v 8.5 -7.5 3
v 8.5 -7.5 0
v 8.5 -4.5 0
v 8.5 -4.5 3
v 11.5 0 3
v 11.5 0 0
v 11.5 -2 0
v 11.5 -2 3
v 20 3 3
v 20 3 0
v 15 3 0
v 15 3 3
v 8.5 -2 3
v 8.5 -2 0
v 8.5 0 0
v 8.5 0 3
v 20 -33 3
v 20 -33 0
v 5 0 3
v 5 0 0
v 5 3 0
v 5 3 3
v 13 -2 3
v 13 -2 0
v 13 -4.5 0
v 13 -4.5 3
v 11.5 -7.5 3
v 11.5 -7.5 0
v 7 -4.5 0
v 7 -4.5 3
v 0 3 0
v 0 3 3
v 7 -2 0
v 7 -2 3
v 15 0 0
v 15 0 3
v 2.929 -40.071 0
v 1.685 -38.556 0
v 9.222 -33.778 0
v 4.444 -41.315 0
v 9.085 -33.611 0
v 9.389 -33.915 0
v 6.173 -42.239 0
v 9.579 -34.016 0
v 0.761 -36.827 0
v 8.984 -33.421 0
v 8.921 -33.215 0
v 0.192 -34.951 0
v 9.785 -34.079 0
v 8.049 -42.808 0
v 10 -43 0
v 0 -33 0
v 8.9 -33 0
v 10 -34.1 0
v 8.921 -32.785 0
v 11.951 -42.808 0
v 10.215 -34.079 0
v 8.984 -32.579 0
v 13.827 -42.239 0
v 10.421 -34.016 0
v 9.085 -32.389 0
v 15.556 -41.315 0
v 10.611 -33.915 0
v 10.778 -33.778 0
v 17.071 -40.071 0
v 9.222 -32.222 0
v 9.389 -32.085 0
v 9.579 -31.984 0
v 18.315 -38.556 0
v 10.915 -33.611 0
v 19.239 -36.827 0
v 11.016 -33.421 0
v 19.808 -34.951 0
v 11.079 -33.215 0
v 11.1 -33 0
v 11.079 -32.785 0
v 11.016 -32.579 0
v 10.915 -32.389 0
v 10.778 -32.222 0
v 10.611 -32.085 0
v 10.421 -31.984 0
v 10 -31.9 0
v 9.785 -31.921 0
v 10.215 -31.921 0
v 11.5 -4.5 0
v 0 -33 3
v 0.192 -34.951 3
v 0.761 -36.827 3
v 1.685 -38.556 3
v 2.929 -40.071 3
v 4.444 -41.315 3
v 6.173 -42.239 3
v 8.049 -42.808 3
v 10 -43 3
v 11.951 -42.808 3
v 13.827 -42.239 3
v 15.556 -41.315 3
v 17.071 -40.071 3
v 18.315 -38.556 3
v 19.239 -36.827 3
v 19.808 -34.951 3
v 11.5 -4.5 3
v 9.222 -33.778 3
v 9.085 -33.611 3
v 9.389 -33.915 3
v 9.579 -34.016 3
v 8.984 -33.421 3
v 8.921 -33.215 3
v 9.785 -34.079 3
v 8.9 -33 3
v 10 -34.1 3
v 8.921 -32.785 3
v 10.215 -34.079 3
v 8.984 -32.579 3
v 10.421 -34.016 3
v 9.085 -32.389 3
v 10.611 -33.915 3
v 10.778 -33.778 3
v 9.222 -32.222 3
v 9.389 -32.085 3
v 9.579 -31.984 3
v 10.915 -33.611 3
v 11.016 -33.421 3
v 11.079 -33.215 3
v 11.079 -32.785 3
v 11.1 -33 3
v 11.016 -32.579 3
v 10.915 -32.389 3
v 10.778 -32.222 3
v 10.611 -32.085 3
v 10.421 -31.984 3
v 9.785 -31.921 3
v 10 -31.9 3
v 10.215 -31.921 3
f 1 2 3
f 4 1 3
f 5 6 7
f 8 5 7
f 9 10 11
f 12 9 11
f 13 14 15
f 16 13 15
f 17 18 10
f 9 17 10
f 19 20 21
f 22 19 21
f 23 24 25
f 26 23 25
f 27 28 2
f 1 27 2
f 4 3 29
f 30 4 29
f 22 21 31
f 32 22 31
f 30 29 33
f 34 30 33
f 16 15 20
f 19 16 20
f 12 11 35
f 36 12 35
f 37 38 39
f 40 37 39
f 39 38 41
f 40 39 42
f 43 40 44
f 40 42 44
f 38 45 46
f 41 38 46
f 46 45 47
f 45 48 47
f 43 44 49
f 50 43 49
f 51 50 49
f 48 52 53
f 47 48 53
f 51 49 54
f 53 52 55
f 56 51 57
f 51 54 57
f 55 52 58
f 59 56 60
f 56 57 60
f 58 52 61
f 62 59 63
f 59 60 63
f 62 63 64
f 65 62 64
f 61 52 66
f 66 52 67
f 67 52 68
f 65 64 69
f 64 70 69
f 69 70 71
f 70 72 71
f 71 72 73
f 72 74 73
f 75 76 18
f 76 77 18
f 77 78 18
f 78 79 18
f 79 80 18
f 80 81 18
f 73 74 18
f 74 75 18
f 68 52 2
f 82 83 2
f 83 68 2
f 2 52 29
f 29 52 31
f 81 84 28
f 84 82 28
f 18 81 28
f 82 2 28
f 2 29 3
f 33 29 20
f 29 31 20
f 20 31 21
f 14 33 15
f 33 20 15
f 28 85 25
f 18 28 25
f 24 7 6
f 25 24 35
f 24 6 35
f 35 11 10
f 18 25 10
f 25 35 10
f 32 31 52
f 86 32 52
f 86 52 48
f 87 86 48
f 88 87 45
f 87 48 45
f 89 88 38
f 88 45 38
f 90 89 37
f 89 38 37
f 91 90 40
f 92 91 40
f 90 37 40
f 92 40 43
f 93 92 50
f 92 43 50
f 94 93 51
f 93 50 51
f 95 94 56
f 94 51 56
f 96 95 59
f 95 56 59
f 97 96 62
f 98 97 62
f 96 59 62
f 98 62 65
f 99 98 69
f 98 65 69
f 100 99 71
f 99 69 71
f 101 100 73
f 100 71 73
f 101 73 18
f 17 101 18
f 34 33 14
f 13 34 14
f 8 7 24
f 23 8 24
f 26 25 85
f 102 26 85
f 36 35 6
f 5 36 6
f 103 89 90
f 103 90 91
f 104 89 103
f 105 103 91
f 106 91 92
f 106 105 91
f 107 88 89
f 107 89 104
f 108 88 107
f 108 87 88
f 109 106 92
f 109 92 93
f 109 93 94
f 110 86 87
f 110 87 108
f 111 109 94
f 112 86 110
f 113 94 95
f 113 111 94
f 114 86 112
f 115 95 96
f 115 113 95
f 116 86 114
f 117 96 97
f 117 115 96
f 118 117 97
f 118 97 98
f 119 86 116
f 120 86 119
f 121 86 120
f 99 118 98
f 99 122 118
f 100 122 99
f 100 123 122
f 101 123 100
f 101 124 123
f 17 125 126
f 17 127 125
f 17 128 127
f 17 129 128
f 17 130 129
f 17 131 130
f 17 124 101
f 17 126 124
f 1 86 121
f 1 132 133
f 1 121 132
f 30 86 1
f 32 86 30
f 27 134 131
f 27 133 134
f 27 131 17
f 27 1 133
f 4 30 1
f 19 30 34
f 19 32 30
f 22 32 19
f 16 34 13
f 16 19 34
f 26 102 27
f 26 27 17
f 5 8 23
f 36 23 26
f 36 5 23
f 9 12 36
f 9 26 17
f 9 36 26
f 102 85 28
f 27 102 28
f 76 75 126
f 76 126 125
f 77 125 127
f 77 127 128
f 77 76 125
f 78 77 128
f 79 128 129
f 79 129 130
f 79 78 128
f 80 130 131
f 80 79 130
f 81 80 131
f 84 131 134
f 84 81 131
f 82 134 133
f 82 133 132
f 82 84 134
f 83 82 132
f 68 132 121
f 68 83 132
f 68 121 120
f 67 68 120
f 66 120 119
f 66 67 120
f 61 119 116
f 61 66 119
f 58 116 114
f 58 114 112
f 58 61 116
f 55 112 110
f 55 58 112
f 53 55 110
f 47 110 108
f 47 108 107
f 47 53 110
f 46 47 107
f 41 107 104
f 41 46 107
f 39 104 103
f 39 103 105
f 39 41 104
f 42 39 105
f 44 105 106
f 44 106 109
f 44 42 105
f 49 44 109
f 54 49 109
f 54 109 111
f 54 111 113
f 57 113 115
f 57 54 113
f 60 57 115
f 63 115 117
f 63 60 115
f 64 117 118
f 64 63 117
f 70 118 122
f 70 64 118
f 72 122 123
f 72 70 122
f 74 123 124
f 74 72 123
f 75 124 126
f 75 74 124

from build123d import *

# Parameters (mm, degrees)
F0_R     = 1.1
F1_DEPTH = 3


with BuildPart() as f1:
    # F0 (on Top) → F1 (new body)
    with BuildSketch(Plane.XY):
        with BuildLine():
            Line((8.5, 0), (5, 0))
            Line((5, 0), (5, 3))
            Line((5, 3), (0, 3))
            Line((0, 3), (0, 0))
            Line((0, 0), (0, -33))
            ThreePointArc((0, -33), (10, -43), (20, -33))
            Line((20, -33), (20, 0))
            Line((20, 0), (20, 3))
            Line((20, 3), (15, 3))
            Line((15, 3), (15, 0))
            Line((15, 0), (11.5, 0))
            Line((11.5, 0), (11.5, -2))
            Line((11.5, -2), (13, -2))
            Line((13, -2), (13, -4.5))
            Line((13, -4.5), (11.5, -4.5))
            Line((11.5, -4.5), (11.5, -7.5))
            Line((11.5, -7.5), (10, -7.5))
            Line((10, -7.5), (8.5, -7.5))
            Line((8.5, -7.5), (8.5, -4.5))
            Line((8.5, -4.5), (7, -4.5))
            Line((7, -4.5), (7, -2))
            Line((7, -2), (8.5, -2))
            Line((8.5, -2), (8.5, 0))
        make_face()
        with Locations((10, -33)):
            Circle(F0_R, mode=Mode.SUBTRACT)
    extrude(amount=F1_DEPTH)


solid = f1.part
